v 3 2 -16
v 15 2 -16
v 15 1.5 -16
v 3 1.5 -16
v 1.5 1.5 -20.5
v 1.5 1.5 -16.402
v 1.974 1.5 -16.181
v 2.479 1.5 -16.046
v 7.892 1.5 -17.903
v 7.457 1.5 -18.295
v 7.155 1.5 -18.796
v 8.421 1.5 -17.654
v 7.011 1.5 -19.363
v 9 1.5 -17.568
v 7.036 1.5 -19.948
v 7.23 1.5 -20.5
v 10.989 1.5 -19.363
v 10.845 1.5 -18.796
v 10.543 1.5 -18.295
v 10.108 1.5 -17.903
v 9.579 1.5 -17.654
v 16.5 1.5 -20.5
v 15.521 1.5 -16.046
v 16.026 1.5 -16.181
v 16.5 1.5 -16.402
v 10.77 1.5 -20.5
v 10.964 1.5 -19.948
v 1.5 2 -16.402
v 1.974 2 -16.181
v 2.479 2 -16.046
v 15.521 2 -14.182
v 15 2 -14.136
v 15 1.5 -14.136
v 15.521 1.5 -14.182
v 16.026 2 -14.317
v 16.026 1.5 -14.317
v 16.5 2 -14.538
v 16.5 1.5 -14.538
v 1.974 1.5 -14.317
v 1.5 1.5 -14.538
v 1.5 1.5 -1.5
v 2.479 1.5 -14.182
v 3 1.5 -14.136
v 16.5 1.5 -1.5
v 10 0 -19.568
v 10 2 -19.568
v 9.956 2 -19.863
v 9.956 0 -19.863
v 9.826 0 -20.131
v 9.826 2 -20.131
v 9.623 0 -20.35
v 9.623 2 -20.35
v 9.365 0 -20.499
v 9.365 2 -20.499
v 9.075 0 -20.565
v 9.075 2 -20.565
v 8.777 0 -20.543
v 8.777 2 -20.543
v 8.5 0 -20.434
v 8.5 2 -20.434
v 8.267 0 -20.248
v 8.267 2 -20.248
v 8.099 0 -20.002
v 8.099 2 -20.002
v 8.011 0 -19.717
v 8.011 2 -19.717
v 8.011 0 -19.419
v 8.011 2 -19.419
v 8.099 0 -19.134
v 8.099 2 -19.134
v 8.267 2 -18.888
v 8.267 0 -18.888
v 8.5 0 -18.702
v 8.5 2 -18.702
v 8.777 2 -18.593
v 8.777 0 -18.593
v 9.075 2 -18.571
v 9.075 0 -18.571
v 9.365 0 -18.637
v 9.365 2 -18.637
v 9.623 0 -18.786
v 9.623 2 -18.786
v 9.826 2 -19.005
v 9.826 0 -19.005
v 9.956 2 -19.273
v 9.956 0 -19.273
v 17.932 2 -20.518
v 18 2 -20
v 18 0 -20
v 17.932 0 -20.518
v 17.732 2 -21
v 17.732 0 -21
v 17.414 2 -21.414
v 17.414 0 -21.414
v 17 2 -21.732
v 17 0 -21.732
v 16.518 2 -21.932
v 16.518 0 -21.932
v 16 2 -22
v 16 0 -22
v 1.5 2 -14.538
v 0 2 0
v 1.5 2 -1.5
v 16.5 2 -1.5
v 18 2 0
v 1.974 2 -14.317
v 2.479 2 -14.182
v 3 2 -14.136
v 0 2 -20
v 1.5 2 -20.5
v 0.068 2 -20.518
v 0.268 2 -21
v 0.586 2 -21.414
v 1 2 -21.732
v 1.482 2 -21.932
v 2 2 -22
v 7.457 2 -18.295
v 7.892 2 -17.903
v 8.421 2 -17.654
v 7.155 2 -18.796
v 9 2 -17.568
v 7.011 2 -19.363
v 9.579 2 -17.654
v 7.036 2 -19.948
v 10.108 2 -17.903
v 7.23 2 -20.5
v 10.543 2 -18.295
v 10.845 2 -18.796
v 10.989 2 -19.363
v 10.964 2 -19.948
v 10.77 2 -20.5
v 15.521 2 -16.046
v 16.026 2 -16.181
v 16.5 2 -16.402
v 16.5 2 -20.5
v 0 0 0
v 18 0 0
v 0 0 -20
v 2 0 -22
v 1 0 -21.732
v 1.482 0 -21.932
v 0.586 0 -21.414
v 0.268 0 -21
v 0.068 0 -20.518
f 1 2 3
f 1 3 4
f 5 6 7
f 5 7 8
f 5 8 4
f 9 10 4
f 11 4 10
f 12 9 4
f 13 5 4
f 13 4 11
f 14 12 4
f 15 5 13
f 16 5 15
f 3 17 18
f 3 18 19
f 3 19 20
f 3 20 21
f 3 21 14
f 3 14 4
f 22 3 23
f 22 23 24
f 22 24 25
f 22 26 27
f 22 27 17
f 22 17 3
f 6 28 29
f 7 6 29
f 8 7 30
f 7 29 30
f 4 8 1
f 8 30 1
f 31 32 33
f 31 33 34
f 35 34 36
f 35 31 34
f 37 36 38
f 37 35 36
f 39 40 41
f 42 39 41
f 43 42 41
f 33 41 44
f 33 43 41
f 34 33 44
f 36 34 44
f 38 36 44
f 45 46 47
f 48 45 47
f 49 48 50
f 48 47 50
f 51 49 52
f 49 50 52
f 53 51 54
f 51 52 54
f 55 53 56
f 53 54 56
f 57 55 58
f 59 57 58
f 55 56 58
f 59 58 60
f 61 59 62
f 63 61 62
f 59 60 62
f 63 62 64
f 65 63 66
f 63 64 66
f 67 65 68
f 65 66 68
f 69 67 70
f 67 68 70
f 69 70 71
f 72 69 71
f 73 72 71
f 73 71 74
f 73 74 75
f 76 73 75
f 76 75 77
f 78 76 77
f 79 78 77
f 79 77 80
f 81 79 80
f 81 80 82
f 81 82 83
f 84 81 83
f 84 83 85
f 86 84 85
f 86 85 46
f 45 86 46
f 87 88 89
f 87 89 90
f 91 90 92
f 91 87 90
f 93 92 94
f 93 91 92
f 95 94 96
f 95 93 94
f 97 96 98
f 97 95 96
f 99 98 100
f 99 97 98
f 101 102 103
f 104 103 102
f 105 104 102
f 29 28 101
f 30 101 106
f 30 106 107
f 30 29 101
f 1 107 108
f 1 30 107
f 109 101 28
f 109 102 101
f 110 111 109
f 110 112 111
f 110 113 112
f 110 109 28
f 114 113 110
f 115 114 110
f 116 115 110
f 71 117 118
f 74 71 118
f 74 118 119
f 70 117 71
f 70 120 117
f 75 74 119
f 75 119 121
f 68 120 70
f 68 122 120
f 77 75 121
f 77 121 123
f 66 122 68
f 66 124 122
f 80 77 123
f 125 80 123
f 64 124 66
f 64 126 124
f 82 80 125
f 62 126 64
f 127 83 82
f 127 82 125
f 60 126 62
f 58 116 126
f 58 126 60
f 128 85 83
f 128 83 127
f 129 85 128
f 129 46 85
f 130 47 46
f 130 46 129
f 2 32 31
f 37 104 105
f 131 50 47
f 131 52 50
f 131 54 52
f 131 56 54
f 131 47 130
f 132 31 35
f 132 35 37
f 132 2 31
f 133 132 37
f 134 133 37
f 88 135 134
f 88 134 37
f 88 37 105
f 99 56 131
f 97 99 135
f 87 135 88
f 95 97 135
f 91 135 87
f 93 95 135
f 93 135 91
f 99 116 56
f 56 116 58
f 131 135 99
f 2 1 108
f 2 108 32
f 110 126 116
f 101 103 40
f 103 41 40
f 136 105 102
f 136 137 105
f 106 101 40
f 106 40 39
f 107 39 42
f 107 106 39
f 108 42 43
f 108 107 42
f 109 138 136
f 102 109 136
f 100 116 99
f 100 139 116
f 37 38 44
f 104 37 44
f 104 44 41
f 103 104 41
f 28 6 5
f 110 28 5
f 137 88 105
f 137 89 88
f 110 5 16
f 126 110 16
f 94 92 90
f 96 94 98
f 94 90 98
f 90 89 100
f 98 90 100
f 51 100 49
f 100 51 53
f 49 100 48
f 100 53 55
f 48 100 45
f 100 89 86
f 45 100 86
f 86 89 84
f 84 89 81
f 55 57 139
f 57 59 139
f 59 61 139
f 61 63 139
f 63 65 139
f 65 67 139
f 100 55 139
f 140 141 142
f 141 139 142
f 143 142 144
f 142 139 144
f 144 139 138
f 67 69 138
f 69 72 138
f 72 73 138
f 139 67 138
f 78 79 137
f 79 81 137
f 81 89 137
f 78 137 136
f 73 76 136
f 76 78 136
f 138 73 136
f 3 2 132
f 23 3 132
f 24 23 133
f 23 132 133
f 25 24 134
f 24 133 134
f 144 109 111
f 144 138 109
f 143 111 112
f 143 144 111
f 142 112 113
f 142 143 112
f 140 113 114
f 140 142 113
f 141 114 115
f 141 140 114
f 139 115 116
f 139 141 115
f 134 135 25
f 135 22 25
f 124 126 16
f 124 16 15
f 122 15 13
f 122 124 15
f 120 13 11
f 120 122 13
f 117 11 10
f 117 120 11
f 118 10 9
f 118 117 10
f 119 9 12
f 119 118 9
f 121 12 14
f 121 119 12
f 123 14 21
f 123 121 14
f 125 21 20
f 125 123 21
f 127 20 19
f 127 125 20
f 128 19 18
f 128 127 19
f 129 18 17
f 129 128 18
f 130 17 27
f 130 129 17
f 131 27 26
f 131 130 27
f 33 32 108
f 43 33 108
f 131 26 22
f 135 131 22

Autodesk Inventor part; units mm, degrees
ref_plane "YZ Plane" through (0, 0, 0) normal (1, 0, 0) x (0, 1, 0)
ref_plane "XZ Plane" through (0, 0, 0) normal (0, 1, 0) x (-1, 0, 0)
ref_plane "XY Plane" through (0, 0, 0) normal (0, 0, 1) x (1, 0, 0)
sketch "Sketch1" plane through (0, 0, 0) normal (0, 1, 0) x (-1, 0, 0)
  line L0 (0, 0) -> (-18, 0)
  line L1 (-18, 0) -> (-18, -22)
  line L2 (-18, -22) -> (0, -22)
  line L3 (0, -22) -> (0, 0)
  line L4 (-1.5, -20.5) -> (2.5, -20.5) construction
  circle A0 centre (-9, -19.8358) radius 1.5
  line L5 (-1, -20.5) -> (-7.6551, -20.5)
  line L6 (-1, -20.5) -> (-1, -1.5)
  line L7 (-1, -1.5) -> (-1, -1)
  line L8 (-1, -1) -> (-17, -1)
  line L9 (-17, -1) -> (-17, -20.5)
  line L10 (-1, -1) -> (-17, -1)
  line L11 (-17, -1) -> (-17, -20.5)
  line L12 (-1, -20.5) -> (-1, -1)
  line L13 (-10.3449, -20.5) -> (-17, -20.5)
  point P0 (0, 0)
  point P1 (-15.5, -20.5)
  dimension "d0" = 18
  dimension "d1" = 22
  dimension "d2" = 3
  dimension "d3" = 0.5
  dimension "d4" = 16
extrude "Extrusion1" add sketch "Sketch1" along normal blind 2 contours L3 L2 L1 L0 | A0 L13 L9 L8 L7 L6 L5
sketch "Sketch8" plane through (0, 2, 0) normal (0, 1, 0) x (1, 0, 0)
  circle A0 centre (9, 19.8358) radius 1.5 projected
  circle A1 centre (9, 19.8358) radius 1.5 projected
  line L0 (0, 0) -> (18, 0) projected
  line L1 (18, 0) -> (18, 22) projected
  line L2 (18, 22) -> (0, 22) projected
  line L3 (0, 22) -> (0, 0) projected
extrude "Extrusion5" add sketch "Sketch8" against normal blind 2 contours A0
sketch "Sketch9" plane through (0, 2, 0) normal (0, 1, 0) x (1, 0, 0)
  line L0 (0, 0) -> (18, 0) projected
  line L1 (18, 0) -> (18, 22) projected
  line L2 (18, 22) -> (0, 22) projected
  line L3 (0, 22) -> (0, 0) projected
  line L4 (18, 22) -> (18, 17.1361)
  line L5 (15, 16) -> (3, 16)
  line L6 (0, 17.1361) -> (0, 22)
  arc A0 (0, 19) -> (3, 16) centre (3, 19) ccw
  arc A1 (15, 16) -> (18, 19) centre (15, 19) ccw
  line L7 (15, 16) -> (3, 16)
  arc A2 (0, 19) -> (3, 16) centre (3, 19) ccw
  arc A3 (15, 16) -> (18, 19) centre (15, 19) ccw
  line L8 (15, 14.1361) -> (3, 14.1361)
  arc A4 (0, 17.1361) -> (3, 14.1361) centre (3, 17.1361) ccw
  arc A5 (15, 14.1361) -> (18, 17.1361) centre (15, 17.1361) ccw
  line L9 (15, 14.1361) -> (3, 14.1361)
  arc A6 (0, 17.1361) -> (3, 14.1361) centre (3, 17.1361) ccw
  arc A7 (15, 14.1361) -> (18, 17.1361) centre (15, 17.1361) ccw
  circle A8 centre (9, 19.568) radius 2
  dimension "d19" = 4
extrude "Extrusion6" cut sketch "Sketch9" against normal blind 0.5 contours L3 A4 L8 A5 L1 L0 | L3 L2 L1 A1 L5 A0
sketch "Sketch11" plane through (0, 0, 0) normal (0, -1, 0) x (1, 0, 0)
  line L0 (1.5, -20.5) -> (16.5, -20.5)
  line L1 (16.5, -20.5) -> (16.5, -1.5)
  line L2 (18, -17.1361) -> (18, 0)
  line L3 (0, -22) -> (18, -22)
  line L4 (0, -22) -> (18, -22)
  line L5 (18, -22) -> (18, 0)
  line L6 (16.5, -1.5) -> (1.5, -1.5)
  line L7 (0, -19) -> (0, -22)
  line L8 (1.5, -1.5) -> (1.5, -20.5)
  line L9 (0, 0) -> (0, -22)
  line L10 (0, 0) -> (0, -17.1361)
  line L11 (0, 0) -> (0, -17.1361)
  line L12 (18, -22) -> (18, -19)
  line L13 (18, 0) -> (0, 0) projected
  line L14 (18, 0) -> (0, 0)
  line L15 (0, 0) -> (18, 0)
  line L16 (18, 0) -> (18, -22)
  line L17 (18, -22) -> (0, -22)
  line L18 (0, -22) -> (0, 0)
  line L19 (16.5, -1.5) -> (1.5, -1.5)
  line L20 (1.5, -1.5) -> (1.5, -20.5)
  line L21 (1.5, -20.5) -> (16.5, -20.5)
  line L22 (16.5, -20.5) -> (16.5, -1.5)
extrude "Extrusion7" add sketch "Sketch11" against normal blind 2
sketch "Sketch12" plane through (0, 2, 0) normal (0, 1, 0) x (1, 0, 0)
  arc A0 (7.2304, 20.5) -> (10.7696, 20.5) centre (9, 19.568) ccw projected
  circle A1 centre (9, 19.568) radius 1
  point P0 (0, 0)
  dimension "d28" = 2
extrude "Extrusion8" cut sketch "Sketch12" against normal blind 2
fillet "Fillet1" radius 2 2 edges at (0, 1, -22) (18, 1, -22)
properties part number "bolsillop2"
